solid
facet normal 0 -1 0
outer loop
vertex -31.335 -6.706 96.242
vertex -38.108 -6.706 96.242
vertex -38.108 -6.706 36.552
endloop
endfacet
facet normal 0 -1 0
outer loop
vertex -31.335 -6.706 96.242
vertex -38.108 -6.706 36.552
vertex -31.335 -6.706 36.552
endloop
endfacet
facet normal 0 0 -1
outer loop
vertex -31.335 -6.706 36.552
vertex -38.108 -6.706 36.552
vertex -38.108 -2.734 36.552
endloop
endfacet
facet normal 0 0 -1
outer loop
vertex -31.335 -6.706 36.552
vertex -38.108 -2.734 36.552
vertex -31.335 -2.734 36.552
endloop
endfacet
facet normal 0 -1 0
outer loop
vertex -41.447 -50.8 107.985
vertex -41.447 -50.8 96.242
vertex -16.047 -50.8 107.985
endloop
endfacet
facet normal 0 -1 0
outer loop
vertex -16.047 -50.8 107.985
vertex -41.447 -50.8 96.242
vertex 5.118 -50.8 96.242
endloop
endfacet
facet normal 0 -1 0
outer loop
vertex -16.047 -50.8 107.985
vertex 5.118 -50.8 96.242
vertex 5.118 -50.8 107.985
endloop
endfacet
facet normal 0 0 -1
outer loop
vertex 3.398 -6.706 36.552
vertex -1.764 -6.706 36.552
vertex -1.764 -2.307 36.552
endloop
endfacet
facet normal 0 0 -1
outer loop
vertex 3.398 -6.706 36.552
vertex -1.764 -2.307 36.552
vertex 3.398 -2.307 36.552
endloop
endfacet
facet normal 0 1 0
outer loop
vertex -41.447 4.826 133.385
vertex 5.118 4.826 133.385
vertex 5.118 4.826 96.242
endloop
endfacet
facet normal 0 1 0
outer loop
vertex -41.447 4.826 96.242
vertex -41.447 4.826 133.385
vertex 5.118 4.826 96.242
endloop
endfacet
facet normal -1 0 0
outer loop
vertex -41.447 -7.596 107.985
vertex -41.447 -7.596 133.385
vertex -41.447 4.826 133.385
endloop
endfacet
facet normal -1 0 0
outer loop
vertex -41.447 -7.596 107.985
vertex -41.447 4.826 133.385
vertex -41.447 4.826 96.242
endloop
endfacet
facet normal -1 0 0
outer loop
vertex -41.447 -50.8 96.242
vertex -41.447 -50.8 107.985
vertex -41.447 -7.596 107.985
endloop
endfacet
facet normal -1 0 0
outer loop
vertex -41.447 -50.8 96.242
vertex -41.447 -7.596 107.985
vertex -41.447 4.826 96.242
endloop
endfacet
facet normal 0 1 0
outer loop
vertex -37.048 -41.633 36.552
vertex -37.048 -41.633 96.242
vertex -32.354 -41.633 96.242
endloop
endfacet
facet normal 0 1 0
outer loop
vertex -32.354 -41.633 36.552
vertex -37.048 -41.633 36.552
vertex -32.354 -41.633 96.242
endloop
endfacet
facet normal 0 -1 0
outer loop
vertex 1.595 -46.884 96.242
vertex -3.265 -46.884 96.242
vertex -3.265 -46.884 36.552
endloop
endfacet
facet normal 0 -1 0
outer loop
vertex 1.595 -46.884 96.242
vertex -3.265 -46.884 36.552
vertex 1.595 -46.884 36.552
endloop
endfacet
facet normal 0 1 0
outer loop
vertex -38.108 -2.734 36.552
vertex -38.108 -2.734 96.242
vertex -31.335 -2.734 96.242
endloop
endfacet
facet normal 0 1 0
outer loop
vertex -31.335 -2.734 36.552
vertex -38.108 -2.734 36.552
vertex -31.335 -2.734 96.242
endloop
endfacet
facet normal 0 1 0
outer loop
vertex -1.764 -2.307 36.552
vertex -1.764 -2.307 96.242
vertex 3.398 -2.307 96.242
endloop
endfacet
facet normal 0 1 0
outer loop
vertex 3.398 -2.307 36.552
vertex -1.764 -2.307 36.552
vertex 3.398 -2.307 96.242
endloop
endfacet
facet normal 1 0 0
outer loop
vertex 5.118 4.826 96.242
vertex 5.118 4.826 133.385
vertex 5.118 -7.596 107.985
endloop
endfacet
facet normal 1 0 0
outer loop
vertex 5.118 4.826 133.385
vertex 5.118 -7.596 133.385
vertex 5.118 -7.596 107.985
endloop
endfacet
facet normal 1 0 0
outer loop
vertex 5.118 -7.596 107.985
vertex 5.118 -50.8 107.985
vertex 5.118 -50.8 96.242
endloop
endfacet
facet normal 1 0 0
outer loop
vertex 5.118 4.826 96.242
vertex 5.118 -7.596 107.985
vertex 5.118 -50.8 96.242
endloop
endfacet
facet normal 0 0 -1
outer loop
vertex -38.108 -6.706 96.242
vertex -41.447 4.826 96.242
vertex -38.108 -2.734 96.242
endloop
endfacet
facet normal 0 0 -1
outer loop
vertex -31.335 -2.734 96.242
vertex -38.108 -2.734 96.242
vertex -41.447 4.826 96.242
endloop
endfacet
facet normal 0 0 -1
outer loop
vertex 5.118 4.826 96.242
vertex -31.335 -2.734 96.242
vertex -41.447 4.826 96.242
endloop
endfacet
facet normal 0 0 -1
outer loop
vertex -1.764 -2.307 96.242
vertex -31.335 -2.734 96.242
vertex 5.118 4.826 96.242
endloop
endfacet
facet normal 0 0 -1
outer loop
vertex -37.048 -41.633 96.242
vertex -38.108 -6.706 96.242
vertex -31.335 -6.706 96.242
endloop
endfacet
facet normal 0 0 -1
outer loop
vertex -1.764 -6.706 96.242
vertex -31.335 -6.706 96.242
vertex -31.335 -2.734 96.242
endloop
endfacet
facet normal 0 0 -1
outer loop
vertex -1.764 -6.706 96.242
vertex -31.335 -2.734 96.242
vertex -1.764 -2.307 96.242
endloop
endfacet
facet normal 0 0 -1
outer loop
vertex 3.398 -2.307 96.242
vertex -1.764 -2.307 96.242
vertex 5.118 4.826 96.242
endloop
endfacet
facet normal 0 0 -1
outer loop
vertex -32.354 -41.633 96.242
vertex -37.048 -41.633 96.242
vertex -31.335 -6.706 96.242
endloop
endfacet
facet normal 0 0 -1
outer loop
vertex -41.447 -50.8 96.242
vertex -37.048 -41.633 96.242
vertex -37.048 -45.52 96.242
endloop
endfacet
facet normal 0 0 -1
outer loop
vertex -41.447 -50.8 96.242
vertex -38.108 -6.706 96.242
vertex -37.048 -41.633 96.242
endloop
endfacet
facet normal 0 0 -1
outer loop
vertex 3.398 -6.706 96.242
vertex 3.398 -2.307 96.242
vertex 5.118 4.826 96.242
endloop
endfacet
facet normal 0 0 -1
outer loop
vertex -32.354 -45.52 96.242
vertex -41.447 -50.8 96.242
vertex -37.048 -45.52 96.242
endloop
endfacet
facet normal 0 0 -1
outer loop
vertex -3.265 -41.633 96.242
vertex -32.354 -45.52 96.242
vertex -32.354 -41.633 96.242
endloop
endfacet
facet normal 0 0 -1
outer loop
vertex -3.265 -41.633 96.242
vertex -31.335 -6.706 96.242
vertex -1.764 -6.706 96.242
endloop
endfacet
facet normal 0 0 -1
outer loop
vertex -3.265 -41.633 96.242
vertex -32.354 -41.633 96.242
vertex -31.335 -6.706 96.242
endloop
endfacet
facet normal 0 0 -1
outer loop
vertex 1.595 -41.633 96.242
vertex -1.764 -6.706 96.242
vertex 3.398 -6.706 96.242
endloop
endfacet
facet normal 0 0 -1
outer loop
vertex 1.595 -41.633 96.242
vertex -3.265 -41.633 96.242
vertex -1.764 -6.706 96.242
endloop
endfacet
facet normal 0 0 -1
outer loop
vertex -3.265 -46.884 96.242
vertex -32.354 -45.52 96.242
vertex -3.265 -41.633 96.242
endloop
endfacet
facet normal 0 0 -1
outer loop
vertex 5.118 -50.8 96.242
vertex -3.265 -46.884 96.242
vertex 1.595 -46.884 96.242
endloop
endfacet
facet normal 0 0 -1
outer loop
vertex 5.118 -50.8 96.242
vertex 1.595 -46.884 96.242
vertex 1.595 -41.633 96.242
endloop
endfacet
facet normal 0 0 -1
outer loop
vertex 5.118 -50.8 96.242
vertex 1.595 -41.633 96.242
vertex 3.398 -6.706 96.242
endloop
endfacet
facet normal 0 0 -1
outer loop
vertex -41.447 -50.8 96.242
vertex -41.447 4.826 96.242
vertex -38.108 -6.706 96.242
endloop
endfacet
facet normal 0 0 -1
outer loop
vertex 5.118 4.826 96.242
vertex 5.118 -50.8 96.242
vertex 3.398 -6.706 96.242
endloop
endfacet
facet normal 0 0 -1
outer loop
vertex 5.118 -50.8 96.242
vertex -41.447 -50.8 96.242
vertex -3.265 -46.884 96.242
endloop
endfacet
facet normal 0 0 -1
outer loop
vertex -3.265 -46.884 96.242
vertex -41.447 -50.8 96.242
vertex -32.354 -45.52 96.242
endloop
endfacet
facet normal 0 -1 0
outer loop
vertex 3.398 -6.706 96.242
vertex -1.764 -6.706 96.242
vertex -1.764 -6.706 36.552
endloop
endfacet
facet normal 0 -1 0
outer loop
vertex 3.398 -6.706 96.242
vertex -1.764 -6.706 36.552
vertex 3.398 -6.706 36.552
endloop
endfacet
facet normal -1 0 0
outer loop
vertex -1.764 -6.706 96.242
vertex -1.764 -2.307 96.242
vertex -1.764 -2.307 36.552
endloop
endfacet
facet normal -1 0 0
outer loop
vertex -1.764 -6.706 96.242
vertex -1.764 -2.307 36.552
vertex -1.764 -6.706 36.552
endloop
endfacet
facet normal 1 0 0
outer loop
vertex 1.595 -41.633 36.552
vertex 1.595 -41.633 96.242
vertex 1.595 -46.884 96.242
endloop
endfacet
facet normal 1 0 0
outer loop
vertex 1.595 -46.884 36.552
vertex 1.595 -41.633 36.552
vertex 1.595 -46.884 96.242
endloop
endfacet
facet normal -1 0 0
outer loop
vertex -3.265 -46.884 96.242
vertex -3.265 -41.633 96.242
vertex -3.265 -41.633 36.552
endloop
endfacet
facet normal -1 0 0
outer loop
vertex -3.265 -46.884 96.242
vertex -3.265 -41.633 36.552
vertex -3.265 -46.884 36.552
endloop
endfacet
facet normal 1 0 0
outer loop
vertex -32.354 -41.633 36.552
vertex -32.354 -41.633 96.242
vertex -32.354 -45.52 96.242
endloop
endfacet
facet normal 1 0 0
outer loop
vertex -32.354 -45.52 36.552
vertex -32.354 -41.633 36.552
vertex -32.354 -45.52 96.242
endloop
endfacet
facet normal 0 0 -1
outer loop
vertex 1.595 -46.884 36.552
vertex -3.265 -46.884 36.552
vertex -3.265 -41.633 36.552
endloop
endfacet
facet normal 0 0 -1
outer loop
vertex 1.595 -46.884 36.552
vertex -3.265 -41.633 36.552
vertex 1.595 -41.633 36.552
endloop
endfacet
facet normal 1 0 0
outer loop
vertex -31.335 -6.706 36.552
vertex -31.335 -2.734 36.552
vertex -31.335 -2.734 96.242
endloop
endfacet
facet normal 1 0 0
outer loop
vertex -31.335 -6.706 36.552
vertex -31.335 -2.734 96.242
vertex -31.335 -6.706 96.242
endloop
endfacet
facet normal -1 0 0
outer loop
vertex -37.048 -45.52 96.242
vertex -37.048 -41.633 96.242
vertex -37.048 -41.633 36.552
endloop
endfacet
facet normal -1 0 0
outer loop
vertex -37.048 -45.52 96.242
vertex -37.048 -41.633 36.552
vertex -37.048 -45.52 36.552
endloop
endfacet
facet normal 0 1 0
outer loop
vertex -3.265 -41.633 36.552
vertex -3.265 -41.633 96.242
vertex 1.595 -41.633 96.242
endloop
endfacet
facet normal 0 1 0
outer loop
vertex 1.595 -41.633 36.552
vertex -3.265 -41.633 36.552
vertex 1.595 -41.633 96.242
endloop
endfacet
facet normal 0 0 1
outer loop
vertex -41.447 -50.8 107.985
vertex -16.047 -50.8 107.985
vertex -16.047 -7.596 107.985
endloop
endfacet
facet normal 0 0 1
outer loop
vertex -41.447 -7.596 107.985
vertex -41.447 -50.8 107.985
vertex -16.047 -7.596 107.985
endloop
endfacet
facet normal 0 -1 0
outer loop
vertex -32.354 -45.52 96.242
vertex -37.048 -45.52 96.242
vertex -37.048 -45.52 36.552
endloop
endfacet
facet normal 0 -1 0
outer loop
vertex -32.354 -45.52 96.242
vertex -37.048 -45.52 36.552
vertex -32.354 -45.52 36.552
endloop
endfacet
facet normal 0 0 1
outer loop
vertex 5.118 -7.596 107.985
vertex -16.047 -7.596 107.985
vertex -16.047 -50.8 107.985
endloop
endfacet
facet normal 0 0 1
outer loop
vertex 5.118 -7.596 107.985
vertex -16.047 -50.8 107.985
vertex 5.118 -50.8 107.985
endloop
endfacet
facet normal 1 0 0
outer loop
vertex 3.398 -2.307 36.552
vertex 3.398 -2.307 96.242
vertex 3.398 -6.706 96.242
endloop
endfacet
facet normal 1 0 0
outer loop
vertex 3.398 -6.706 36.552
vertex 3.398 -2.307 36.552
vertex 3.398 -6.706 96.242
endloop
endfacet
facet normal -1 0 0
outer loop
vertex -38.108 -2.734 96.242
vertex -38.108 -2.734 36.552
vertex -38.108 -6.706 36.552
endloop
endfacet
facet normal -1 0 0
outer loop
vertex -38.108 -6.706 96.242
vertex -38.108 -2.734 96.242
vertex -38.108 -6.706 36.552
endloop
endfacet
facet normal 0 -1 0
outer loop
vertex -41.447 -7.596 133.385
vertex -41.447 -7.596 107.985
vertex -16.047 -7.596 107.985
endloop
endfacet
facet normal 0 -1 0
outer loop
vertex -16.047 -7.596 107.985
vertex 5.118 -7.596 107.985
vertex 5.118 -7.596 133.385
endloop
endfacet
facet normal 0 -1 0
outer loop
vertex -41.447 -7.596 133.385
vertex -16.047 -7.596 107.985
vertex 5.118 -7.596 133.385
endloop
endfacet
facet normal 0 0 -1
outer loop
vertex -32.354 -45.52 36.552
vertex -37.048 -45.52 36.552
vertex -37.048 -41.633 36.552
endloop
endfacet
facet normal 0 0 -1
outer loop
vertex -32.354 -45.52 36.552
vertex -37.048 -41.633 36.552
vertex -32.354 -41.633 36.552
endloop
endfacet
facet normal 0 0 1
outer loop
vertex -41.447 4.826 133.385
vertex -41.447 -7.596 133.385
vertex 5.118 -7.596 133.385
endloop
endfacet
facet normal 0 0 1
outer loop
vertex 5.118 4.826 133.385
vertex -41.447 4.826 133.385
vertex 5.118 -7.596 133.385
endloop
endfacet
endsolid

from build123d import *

# Parameters (mm, degrees)
F1_DEPTH  = 4.1148
F4_W      = 1.7967561726
F4_H      = 11.5752667189
F5_DEPTH  = 25.4
F3_W      = 21.1648978293
F3_H      = 11.7423608899
F6_DEPTH  = 25.4
F7_W      = 21.1648978293
F7_H      = 7.5958641246
F8_DEPTH  = 25.4
F9_DEPTH  = 25.4
F10_DEPTH = 25.4
F11_W     = 5.1620183513
F11_H     = 4.3984993827
F11_W_2   = 6.7732334137
F11_H_2   = 3.9715627208
F11_W_3   = 4.8598810099
F11_H_3   = 5.2507780492
F11_W_4   = 4.6935081482
F11_H_4   = 3.8872100413
F12_DEPTH = 59.69
F13_DEPTH = 4.826


with BuildPart() as f1:
    # F0 (on Front) → F1 (new body)
    with BuildSketch(Plane.XZ):
        Polygon((1.2734923512, 7.3978709988), (1.0500258068, 4.5483880676), (11.4485891536, 4.5483880676), (12.1993478388, 7.3978709988), align=None)
        Polygon((-2.1805709694, 3.6492620129), (1.0500258068, 4.5483880676), (1.2734923512, 7.3978709988), (-2.1805709694, 6.1951475218), align=None)
        Polygon((11.4485891536, 4.5483880676), (1.0500258068, 4.5483880676), (-2.1805709694, 3.6492620129), (-0.5589149077, 2.3352366406), (16.0257890821, 2.3352366406), align=None)
        Polygon((12.1993478388, 7.3978709988), (11.4485891536, 4.5483880676), (16.0257890821, 2.3352366406), (17.6053401083, 4.832720384), align=None)
    extrude(amount=F1_DEPTH)


with BuildPart() as f5:
    # F4 (on face) → F5 (new body)
    with BuildSketch(Plane.XZ):
        with Locations((4.1603924474, 102.1747291088)):
            Rectangle(F4_W, F4_H)
    extrude(amount=F5_DEPTH)

    # F3 (on Front) → F6 (join)
    with BuildSketch(Plane.XZ):
        with Locations((-5.4645147175, 102.1133996546)):
            Rectangle(F3_W, F3_H)
    extrude(amount=F6_DEPTH)

    # F7 (on face) → F8 (join)
    with BuildSketch(Plane.XY.offset(107.9845800996)):
        with Locations((-5.4645147175, -3.7979320623)):
            Rectangle(F7_W, F7_H)
    extrude(amount=F8_DEPTH)

    # F9 (add): a face of the model
    f9_faces = [f5.faces().sort_by_distance(p)[0] for p in [
        (-5.4645147175, -25.4, 102.1133996546),
    ]]
    extrude(f9_faces, amount=F9_DEPTH)

    # F10 (add): a face of the model
    f10_faces = [f5.faces().sort_by_distance(p)[0] for p in [
        (-16.0469636321, -20.1206151979, 106.6520580868),
    ]]
    extrude(f10_faces, amount=F10_DEPTH)

    # F11 (on face) → F12 (join)
    with BuildSketch(Plane(origin=(0, 0, 96.2422192097), x_dir=(1, 0, 0), z_dir=(0, 0, -1))):
        with Locations((0.8170665242, 4.5063399011)):
            Rectangle(F11_W, F11_H)
        with Locations((-34.7215011716, 4.719808232)):
            Rectangle(F11_W_2, F11_H_2)
        with Locations((-0.8347902913, 44.2584287375)):
            Rectangle(F11_W_3, F11_H_3)
        with Locations((-34.7008481622, 43.5766447335)):
            Rectangle(F11_W_4, F11_H_4)
    extrude(amount=F12_DEPTH)

    # F13 (add): a face of the model
    f13_faces = [f5.faces().sort_by_distance(p)[0] for p in [
        (-18.1645147175, 0, 114.8133996546),
    ]]
    extrude(f13_faces, amount=F13_DEPTH)


solid = f5.part
